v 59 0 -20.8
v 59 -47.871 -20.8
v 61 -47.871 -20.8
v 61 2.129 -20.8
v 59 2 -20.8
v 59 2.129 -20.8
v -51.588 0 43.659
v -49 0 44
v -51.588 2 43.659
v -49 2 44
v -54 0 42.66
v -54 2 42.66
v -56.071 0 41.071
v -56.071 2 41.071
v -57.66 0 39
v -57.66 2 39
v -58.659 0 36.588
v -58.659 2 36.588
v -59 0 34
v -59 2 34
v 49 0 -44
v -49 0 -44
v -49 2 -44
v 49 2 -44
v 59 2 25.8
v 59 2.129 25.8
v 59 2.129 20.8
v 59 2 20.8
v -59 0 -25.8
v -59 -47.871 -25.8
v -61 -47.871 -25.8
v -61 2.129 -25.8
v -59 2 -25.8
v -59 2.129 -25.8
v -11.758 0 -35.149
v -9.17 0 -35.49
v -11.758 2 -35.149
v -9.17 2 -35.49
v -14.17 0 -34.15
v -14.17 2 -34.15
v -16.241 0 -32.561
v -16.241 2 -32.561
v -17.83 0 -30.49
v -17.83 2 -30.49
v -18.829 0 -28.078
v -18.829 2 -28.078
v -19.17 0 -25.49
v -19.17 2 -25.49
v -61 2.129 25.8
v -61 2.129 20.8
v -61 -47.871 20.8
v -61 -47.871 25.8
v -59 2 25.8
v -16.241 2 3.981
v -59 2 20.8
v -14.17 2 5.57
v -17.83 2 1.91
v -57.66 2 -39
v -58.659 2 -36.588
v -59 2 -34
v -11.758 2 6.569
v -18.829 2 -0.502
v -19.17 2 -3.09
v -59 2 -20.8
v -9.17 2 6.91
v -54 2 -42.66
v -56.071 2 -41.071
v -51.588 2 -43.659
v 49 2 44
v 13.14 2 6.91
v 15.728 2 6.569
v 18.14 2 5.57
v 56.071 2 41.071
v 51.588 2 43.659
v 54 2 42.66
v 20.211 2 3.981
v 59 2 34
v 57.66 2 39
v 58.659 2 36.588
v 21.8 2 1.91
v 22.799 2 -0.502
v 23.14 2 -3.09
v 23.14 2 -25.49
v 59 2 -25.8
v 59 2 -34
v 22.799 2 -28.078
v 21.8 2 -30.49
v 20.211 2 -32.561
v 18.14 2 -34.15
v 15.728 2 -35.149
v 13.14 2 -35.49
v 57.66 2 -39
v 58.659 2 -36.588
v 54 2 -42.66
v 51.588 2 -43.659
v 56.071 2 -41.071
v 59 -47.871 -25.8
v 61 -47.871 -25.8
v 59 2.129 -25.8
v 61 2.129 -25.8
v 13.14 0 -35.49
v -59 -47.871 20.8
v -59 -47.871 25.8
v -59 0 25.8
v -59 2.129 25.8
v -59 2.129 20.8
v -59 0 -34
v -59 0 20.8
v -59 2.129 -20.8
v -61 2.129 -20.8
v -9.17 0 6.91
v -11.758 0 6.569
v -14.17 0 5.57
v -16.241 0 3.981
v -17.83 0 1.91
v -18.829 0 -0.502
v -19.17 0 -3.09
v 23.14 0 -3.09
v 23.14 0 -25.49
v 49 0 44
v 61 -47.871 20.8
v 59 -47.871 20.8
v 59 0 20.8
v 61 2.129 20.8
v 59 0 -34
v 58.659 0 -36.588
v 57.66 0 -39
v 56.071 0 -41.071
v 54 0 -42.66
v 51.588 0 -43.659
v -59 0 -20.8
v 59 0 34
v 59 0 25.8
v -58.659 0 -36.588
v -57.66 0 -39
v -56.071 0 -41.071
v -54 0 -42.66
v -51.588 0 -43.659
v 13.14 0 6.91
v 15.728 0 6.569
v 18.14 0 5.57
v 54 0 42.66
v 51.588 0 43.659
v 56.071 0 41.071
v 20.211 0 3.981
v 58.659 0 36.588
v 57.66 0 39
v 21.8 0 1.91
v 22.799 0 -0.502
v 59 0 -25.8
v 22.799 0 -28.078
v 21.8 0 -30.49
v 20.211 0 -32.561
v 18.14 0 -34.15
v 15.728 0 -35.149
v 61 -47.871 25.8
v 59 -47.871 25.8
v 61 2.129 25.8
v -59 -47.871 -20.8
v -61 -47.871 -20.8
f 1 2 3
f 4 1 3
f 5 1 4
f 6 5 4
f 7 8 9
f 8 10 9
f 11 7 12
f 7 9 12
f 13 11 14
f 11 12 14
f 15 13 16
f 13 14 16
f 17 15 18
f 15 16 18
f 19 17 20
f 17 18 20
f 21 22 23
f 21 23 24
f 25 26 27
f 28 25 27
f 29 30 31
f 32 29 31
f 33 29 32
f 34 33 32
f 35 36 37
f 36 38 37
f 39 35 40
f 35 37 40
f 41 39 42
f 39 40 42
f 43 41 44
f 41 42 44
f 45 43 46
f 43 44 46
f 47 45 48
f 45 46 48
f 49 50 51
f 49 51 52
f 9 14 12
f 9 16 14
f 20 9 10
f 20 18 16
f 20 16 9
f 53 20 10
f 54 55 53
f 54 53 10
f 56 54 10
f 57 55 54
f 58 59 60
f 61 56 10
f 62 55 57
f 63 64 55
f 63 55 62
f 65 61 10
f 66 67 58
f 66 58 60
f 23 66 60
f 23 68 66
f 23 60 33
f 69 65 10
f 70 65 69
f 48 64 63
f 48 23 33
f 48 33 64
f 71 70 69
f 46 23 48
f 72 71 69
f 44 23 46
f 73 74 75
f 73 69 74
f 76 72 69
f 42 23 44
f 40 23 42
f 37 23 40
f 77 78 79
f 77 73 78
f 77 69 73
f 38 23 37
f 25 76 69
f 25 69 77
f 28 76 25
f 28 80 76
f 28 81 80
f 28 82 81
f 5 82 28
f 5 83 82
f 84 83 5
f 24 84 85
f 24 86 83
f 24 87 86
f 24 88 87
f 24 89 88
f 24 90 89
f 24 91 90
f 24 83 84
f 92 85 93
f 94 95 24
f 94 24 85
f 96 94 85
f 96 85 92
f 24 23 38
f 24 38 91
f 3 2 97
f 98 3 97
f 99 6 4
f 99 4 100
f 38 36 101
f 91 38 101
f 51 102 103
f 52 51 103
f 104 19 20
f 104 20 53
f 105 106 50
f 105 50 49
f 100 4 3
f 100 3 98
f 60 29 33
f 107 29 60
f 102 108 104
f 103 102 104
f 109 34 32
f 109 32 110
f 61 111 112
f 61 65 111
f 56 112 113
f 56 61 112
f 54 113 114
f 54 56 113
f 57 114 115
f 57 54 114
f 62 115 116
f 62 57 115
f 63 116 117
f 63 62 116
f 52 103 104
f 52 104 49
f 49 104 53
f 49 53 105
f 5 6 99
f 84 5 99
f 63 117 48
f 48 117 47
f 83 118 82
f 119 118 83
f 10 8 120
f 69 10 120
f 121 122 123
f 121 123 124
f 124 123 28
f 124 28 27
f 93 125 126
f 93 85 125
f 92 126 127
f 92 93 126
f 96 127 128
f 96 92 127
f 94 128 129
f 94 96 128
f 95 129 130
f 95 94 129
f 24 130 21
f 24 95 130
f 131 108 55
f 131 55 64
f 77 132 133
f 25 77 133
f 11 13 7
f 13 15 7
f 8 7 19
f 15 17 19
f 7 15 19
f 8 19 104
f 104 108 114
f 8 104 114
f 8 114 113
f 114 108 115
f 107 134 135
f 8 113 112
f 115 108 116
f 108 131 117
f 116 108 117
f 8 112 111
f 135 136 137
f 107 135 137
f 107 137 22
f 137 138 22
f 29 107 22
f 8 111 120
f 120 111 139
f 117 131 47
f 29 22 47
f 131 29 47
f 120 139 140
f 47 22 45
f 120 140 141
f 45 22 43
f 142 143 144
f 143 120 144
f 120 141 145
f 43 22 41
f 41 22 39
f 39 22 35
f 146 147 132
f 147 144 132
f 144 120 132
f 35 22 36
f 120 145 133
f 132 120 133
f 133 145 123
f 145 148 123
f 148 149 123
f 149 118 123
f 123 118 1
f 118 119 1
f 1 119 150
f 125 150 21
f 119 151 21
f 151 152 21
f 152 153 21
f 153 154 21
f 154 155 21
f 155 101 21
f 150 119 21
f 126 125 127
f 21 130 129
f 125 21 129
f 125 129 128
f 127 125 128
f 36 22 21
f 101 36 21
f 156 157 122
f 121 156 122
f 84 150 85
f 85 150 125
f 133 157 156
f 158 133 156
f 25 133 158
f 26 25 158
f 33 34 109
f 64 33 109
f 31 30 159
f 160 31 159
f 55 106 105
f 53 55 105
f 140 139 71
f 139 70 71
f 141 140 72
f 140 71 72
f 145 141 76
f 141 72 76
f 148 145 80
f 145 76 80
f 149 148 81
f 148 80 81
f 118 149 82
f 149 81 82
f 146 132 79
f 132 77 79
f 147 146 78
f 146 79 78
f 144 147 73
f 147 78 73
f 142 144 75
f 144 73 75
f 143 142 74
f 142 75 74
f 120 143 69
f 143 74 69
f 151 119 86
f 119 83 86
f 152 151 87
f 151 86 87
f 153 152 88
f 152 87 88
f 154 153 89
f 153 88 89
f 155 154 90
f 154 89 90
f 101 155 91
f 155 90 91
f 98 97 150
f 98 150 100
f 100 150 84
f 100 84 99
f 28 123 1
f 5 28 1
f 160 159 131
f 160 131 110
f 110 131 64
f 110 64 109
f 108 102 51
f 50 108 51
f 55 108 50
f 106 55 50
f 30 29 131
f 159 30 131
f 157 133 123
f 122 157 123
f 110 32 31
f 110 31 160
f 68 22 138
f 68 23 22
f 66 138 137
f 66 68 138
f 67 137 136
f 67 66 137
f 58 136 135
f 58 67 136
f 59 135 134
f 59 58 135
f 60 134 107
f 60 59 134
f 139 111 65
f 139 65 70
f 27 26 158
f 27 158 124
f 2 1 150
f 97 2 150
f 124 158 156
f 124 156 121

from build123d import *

# Parameters (mm, degrees)
ESBO_O1_W                = 118
ESBO_O1_H                = 88
RESSALTO_EXTRUS_O1_DEPTH = 2
FILETE1_R                = 10
FILETE2_R                = 10
ESBO_O2_W                = 42.31
ESBO_O2_H                = 42.4
CORTE_EXTRUS_O2_DEPTH    = 2
FILETE3_R                = 10
ESBO_O5_W                = 5
ESBO_O5_H                = 50
RESSALTO_EXTRUS_O3_DEPTH = 2
RESSALTO_EXTRUS_O4_START = -10
ESBO_O6_W                = 5
ESBO_O6_H                = 50
RESSALTO_EXTRUS_O4_DEPTH = 2


with BuildPart() as part:
    # Esboço1 → Ressalto-extrusão1 (new body)
    with BuildSketch(Plane(origin=(0, 0, 0), x_dir=(1, 0, 0), z_dir=(0, 1, 0))):
        Rectangle(ESBO_O1_W, ESBO_O1_H)
    extrude(amount=RESSALTO_EXTRUS_O1_DEPTH)

    # Filete1
    filete1_edges = [part.edges().sort_by_distance(p)[0] for p in [
        (59, 1, -44),
    ]]
    fillet(filete1_edges, radius=FILETE1_R)

    # Filete2
    filete2_edges = [part.edges().sort_by_distance(p)[0] for p in [
        (59, 1, 44),
        (-59, 1, 44),
        (-59, 1, -44),
    ]]
    fillet(filete2_edges, radius=FILETE2_R)

    # Esboço2 → Corte-extrusão2 (cut)
    with BuildSketch(Plane(origin=(0, 0, 0), x_dir=(1, 0, 0), z_dir=(0, 1, 0))):
        with Locations((1.985, 14.29)):
            Rectangle(ESBO_O2_W, ESBO_O2_H)
    extrude(amount=CORTE_EXTRUS_O2_DEPTH, mode=Mode.SUBTRACT)

    # Filete3
    filete3_edges = [part.edges().sort_by_distance(p)[0] for p in [
        (-19.17, 1, -35.49),
        (-19.17, 1, 6.91),
        (23.14, 1, 6.91),
        (23.14, 1, -35.49),
    ]]
    fillet(filete3_edges, radius=FILETE3_R)

    # Esboço5 → Ressalto-extrusão3 (add)
    with BuildSketch(Plane(origin=(59, 0, 0), x_dir=(0, 0, -1), z_dir=(1, 0, 0))):
        with Locations((-23.3, -22.870840319)):
            Rectangle(ESBO_O5_W, ESBO_O5_H)
        with Locations((23.3, -22.870840319)):
            Rectangle(ESBO_O5_W, ESBO_O5_H)
    extrude(amount=RESSALTO_EXTRUS_O3_DEPTH)

    # Esboço6 → Ressalto-extrusão4 (add)
    with BuildSketch(Plane.ZY.offset(69).offset(RESSALTO_EXTRUS_O4_START)):
        with Locations((-23.3, -22.870840319)):
            Rectangle(ESBO_O6_W, ESBO_O6_H)
        with Locations((23.3, -22.870840319)):
            Rectangle(ESBO_O6_W, ESBO_O6_H)
    extrude(amount=RESSALTO_EXTRUS_O4_DEPTH)


solid = part.part
